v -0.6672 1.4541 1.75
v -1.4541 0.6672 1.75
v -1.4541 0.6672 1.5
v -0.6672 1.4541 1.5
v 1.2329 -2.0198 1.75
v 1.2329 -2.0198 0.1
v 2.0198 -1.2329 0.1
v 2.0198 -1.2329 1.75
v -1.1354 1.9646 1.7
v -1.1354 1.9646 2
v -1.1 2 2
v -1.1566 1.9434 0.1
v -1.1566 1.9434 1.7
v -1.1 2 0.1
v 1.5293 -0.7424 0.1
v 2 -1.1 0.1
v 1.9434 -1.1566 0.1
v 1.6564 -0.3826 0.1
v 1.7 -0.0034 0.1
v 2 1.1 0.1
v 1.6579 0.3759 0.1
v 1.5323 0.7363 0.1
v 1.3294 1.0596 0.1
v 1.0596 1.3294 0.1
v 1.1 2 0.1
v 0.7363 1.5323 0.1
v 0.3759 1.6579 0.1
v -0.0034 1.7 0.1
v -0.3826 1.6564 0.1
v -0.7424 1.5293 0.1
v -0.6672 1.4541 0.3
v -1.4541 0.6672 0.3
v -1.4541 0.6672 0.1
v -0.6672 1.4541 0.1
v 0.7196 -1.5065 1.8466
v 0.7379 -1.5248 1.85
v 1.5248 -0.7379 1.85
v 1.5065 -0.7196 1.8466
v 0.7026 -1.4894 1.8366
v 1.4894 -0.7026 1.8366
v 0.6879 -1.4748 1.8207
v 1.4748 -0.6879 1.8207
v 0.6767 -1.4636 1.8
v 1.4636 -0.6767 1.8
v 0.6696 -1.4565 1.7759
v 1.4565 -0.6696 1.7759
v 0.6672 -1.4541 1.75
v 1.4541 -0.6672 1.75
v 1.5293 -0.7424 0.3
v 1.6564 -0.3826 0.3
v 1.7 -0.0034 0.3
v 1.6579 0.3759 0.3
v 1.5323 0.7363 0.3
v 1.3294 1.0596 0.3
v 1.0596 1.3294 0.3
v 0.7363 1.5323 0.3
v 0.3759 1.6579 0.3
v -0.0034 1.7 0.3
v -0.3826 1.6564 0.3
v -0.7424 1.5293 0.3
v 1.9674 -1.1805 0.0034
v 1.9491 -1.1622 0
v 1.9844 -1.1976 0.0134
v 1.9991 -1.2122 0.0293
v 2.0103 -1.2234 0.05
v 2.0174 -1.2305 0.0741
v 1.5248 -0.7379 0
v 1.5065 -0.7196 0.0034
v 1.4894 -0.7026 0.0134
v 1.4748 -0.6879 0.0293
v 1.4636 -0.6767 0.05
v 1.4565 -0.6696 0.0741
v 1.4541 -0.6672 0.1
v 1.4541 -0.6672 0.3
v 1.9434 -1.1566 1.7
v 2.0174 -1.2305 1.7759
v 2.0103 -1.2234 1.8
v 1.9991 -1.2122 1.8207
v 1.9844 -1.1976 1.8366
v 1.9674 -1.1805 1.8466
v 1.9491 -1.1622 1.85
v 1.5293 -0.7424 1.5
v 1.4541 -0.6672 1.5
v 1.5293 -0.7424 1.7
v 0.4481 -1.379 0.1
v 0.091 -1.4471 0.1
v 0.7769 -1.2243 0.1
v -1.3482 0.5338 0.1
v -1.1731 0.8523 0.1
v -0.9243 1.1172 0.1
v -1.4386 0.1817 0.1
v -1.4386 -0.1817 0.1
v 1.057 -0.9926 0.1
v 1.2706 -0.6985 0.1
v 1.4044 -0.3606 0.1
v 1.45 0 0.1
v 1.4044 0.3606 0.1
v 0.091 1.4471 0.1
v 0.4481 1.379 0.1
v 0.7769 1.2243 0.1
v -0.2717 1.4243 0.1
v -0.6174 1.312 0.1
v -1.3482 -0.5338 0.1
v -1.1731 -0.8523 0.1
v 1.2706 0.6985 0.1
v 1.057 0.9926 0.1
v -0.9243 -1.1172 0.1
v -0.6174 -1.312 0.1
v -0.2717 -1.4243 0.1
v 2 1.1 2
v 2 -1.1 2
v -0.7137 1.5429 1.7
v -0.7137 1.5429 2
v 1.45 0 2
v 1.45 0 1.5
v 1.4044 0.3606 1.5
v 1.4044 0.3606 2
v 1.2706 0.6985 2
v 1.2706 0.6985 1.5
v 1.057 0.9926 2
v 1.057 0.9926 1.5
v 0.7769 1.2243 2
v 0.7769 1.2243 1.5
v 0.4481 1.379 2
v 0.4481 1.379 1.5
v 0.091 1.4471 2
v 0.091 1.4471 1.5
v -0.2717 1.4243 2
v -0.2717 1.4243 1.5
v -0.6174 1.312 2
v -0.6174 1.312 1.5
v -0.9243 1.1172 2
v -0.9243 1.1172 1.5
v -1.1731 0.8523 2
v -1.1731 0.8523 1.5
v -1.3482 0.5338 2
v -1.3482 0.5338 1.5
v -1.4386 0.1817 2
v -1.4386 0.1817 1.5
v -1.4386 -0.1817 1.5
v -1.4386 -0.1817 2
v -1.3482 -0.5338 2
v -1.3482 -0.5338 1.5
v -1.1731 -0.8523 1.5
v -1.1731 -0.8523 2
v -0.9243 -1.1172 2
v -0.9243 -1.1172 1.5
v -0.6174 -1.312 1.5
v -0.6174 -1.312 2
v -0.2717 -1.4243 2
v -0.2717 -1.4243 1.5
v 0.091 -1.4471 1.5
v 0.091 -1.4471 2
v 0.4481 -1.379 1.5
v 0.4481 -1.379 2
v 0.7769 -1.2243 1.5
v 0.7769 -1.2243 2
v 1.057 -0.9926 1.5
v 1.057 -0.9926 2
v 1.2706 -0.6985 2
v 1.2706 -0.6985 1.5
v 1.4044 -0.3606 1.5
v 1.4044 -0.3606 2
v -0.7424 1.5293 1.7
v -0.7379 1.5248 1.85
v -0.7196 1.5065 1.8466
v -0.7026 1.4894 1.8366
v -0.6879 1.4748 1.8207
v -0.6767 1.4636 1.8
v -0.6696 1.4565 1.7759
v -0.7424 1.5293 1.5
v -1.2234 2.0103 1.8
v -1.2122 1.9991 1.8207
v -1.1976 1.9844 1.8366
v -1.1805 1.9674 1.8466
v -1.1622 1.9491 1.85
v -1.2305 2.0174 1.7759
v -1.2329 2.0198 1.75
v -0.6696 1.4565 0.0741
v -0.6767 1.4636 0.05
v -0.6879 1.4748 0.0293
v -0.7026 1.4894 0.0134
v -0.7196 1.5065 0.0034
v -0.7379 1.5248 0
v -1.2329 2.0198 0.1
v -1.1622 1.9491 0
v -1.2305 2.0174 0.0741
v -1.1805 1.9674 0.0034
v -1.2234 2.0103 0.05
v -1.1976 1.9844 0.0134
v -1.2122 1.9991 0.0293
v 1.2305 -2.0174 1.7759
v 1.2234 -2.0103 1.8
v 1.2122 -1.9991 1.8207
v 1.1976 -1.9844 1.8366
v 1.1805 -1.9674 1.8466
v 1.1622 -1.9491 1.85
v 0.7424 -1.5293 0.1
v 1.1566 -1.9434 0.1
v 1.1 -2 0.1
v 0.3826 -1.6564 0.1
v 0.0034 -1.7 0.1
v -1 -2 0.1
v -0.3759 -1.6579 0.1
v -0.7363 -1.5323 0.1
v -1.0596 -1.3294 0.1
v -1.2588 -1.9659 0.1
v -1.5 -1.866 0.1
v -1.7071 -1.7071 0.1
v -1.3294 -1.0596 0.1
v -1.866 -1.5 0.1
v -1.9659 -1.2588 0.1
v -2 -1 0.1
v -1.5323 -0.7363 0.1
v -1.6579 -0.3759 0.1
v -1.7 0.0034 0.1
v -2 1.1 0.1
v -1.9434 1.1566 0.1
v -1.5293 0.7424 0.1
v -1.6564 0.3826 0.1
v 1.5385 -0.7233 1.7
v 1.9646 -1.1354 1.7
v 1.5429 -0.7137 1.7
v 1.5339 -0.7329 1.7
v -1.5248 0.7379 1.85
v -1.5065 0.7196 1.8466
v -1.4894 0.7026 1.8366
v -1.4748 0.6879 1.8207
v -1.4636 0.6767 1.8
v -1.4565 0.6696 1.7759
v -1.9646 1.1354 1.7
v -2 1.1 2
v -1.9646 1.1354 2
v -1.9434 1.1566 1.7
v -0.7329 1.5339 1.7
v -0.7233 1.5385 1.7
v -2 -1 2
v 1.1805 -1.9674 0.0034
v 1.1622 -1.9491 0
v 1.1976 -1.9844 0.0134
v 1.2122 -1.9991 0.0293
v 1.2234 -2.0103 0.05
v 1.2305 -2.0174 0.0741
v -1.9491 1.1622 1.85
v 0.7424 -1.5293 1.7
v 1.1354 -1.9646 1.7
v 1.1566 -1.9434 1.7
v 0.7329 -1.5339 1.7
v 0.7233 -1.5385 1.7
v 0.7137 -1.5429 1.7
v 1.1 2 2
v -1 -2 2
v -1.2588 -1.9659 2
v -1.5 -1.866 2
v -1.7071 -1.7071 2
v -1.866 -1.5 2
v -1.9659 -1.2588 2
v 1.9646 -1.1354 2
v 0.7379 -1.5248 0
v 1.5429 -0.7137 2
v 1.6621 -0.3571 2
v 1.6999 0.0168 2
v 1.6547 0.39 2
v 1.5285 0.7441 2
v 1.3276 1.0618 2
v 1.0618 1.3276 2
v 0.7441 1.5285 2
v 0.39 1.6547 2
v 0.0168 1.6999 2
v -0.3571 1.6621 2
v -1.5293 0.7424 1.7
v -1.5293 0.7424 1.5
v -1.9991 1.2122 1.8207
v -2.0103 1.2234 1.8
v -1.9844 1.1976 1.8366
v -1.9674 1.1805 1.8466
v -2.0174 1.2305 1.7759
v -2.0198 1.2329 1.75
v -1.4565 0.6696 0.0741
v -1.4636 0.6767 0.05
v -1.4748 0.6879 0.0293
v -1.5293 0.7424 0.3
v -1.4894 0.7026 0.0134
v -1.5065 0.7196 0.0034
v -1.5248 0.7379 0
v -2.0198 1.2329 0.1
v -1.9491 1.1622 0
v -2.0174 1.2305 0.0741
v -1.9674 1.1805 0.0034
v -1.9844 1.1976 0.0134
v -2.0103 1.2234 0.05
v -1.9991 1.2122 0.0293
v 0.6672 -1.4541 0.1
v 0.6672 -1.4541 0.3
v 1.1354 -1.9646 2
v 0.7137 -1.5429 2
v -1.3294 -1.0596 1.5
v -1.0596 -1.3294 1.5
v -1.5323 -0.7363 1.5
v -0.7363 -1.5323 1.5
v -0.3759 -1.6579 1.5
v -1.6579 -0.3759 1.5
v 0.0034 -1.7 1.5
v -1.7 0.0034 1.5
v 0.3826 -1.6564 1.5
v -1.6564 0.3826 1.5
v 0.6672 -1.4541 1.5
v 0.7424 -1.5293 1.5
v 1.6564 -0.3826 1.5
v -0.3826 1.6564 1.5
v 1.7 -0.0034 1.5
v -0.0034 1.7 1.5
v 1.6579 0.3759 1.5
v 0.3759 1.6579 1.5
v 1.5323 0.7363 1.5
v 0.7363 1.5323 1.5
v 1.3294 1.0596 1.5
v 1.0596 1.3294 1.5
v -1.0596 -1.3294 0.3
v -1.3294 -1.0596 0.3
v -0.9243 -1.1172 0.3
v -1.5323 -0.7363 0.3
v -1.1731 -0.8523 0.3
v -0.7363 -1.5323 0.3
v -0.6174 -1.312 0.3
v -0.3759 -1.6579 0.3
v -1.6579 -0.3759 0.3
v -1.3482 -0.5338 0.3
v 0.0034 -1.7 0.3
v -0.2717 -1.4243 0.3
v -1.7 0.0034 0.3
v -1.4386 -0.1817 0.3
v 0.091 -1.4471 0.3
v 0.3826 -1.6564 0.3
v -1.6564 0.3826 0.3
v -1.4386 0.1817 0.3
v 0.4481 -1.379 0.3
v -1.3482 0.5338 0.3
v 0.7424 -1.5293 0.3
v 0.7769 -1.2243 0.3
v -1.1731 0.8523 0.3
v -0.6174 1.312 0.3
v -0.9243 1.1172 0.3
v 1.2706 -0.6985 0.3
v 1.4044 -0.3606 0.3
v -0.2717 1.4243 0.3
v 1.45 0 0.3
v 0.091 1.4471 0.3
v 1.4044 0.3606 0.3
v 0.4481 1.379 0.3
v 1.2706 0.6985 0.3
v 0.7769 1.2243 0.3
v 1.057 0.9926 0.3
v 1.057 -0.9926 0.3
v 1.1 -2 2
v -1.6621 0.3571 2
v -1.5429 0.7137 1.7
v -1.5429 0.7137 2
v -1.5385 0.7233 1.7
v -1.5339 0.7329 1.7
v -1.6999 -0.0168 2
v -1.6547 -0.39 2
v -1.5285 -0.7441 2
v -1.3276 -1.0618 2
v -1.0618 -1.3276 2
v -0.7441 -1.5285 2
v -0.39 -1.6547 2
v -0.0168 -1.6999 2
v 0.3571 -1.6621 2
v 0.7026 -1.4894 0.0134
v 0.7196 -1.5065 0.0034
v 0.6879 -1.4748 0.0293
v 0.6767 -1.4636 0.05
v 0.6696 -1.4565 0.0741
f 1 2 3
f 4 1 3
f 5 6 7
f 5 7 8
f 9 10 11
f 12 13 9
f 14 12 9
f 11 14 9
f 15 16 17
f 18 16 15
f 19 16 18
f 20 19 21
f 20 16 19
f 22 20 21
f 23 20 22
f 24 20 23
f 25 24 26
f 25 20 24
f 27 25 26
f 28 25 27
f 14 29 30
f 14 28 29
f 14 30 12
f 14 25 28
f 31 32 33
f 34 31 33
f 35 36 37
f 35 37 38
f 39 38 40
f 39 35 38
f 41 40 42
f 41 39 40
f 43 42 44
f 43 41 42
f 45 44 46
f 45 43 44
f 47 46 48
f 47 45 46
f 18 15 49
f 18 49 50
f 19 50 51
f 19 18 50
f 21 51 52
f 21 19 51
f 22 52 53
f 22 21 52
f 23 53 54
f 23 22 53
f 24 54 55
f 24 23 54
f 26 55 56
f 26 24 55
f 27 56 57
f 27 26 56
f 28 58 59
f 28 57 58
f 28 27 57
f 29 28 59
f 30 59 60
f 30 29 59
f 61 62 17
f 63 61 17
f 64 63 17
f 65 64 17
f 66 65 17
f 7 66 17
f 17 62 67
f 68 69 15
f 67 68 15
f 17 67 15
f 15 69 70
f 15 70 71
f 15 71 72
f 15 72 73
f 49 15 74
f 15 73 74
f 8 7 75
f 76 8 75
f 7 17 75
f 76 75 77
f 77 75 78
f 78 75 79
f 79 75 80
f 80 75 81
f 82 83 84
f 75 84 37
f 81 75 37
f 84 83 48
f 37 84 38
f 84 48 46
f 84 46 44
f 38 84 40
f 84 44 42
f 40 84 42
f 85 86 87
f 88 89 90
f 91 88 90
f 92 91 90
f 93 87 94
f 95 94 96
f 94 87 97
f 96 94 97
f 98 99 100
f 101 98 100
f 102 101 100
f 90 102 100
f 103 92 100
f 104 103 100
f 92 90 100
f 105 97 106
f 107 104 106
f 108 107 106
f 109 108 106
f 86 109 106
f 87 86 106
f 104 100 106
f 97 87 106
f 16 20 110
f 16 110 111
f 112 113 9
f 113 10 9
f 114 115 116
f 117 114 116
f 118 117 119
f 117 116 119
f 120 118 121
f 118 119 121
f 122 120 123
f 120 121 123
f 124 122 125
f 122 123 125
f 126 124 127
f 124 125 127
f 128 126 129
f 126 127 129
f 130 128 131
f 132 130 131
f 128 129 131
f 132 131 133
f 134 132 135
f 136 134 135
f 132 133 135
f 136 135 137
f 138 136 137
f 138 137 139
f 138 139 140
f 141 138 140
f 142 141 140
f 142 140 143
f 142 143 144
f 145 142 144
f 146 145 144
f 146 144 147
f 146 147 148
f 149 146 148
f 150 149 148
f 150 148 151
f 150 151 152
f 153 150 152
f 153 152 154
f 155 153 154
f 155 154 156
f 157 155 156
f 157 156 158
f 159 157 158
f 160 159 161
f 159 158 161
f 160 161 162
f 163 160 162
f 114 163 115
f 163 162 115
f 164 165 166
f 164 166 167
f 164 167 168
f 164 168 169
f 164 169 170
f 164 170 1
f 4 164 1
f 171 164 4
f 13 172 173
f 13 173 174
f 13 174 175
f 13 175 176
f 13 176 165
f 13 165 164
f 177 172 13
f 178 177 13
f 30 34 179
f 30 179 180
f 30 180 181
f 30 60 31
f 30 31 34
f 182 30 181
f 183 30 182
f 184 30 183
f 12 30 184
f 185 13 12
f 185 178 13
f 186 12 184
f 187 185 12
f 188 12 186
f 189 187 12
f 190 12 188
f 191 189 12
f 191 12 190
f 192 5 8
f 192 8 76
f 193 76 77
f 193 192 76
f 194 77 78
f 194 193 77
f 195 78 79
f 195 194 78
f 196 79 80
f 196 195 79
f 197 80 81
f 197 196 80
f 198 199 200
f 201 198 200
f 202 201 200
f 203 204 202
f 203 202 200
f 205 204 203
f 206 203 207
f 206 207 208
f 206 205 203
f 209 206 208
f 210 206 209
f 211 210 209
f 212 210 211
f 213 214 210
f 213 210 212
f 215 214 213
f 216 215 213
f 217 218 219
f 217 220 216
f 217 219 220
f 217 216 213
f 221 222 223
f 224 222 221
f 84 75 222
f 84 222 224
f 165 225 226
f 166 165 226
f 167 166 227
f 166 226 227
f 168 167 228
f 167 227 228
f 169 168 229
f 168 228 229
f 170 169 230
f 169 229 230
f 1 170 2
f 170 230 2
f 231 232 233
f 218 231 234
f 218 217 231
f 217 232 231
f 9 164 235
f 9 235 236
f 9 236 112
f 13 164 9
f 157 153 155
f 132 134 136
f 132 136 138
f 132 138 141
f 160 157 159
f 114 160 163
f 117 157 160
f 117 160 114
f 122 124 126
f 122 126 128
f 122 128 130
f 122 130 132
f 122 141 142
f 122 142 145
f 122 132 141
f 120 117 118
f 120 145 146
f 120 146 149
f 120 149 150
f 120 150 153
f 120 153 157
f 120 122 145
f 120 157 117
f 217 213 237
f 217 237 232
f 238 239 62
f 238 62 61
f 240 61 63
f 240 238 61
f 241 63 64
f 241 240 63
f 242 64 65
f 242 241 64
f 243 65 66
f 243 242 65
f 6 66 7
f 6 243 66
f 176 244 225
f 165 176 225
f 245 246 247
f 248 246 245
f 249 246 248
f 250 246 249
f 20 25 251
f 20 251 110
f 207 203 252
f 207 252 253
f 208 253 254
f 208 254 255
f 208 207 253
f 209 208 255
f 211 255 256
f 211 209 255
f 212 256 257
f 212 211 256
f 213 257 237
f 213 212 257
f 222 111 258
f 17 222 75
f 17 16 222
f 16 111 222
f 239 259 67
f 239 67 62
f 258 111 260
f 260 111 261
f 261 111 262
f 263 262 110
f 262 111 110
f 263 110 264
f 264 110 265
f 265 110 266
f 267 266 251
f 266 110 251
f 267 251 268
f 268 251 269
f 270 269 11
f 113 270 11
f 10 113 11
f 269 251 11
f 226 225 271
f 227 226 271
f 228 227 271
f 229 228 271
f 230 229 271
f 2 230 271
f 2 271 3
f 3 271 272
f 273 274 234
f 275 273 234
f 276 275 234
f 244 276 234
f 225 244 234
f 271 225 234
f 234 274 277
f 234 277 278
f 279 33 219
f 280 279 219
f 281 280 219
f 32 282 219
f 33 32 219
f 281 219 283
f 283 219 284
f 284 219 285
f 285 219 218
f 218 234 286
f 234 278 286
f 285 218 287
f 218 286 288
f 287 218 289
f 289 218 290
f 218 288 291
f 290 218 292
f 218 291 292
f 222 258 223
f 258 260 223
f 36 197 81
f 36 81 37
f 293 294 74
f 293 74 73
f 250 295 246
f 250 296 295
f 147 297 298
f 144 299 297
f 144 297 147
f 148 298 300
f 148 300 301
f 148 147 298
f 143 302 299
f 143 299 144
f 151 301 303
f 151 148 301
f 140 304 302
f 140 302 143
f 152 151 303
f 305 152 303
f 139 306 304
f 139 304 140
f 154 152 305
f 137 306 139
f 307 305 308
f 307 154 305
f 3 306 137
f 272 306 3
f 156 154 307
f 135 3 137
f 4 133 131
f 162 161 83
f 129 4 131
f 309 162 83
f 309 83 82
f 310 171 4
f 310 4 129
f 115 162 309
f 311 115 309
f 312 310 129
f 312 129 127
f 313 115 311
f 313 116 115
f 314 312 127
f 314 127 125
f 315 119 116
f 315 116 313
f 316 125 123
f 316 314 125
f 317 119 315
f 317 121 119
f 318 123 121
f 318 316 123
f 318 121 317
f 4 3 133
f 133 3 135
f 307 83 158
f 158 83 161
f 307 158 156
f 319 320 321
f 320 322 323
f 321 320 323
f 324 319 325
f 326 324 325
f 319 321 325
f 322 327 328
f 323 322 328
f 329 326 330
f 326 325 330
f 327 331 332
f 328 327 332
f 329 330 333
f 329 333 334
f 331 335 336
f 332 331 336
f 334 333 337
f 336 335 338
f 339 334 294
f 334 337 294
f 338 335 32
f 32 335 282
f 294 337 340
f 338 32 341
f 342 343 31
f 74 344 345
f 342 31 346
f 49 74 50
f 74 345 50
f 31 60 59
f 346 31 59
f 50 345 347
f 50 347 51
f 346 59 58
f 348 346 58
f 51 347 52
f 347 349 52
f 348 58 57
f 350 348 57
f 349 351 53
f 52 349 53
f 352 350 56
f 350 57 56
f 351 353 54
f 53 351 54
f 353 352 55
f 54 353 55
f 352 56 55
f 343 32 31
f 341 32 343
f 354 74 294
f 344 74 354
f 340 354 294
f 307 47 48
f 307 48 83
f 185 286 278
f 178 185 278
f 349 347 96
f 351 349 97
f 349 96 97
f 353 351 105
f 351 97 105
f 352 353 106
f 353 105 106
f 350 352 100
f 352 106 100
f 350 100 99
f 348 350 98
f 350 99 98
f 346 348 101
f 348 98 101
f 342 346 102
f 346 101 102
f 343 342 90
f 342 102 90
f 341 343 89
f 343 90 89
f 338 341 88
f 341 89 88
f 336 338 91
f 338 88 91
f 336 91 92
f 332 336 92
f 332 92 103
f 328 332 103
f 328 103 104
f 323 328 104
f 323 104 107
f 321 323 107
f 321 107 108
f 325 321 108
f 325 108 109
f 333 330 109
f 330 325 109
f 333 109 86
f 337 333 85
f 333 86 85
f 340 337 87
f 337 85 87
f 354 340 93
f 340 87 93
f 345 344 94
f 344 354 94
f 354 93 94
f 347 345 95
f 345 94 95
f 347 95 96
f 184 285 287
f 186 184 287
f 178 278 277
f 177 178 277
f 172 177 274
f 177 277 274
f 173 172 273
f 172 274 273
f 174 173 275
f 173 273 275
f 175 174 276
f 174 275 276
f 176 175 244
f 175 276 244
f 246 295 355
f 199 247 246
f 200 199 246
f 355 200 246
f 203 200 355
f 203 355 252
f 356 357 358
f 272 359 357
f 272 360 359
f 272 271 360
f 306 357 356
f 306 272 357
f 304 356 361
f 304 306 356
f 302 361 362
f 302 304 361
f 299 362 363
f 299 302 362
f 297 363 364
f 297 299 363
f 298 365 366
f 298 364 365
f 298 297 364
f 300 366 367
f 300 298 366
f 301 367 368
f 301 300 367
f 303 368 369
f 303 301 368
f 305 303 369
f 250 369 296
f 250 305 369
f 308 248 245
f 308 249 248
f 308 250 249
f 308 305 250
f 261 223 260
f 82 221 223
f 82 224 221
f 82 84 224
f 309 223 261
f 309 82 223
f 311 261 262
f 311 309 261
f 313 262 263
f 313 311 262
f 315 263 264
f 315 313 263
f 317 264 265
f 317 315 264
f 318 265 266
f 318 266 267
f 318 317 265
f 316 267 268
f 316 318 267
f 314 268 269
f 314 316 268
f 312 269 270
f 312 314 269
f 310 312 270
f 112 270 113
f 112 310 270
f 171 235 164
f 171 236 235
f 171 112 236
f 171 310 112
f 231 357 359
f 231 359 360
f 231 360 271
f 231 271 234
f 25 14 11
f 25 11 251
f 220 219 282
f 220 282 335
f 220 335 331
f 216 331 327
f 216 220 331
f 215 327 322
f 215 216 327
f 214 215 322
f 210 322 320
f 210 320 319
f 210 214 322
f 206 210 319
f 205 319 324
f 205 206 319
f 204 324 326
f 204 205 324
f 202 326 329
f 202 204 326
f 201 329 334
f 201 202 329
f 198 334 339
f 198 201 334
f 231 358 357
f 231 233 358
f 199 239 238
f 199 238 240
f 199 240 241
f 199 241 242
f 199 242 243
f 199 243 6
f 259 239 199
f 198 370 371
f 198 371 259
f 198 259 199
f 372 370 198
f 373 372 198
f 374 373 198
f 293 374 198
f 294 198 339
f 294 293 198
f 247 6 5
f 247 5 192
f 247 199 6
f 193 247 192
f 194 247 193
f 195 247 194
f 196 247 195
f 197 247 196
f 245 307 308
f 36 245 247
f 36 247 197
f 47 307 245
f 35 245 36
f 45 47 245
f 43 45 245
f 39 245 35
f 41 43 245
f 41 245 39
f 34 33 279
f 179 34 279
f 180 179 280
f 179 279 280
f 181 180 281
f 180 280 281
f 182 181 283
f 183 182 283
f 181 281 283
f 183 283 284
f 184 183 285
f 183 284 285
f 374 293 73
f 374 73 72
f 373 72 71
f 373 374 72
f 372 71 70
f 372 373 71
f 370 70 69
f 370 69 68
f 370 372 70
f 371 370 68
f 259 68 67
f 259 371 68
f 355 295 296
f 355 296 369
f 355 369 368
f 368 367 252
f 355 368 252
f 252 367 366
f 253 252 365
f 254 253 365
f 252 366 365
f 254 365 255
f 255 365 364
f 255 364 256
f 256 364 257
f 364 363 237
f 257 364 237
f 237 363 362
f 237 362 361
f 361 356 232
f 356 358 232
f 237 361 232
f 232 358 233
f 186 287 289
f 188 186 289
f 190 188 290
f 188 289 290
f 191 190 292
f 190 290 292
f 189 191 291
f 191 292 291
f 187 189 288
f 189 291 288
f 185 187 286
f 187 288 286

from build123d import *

# Parameters (mm, degrees)
EXTRUDE_START        = 0.1
EXTRUDE_1_DEPTH      = 1.9
SKETCH_6_R           = 1.7
CUT_EXTRUDE_5_DEPTH  = 0.3
SKETCH_8_R           = 1.45
EXTRUDE_9_DEPTH      = 0.25
CUT_EXTRUDE_START    = 1.5
SKETCH_6_3_R         = 1.7
CUT_EXTRUDE_12_DEPTH = 0.6
CUT_EXTRUDE_START_2  = 0.05
SKETCH_12_W          = 1.35
SKETCH_12_H          = 0.8
CUT_EXTRUDE_15_DEPTH = 1.172792206
EXTRUDE_START_2      = 1.3
SKETCH_8_3_R         = 1.45
EXTRUDE_16_DEPTH     = 0.7
EXTRUDE_START_3      = 0.08
EXTRUDE_17_DEPTH     = 1.112792206


with BuildPart() as part:
    # Эскиз2 → Вытянуть1 (new body)
    with BuildSketch(Plane.XY.offset(EXTRUDE_START)):
        with BuildLine():
            Line((-1.1, 2), (1.1, 2))
            Line((1.1, 2), (2, 1.1))
            Line((2, 1.1), (2, -1.1))
            Line((2, -1.1), (1.1, -2))
            Line((1.1, -2), (-1, -2))
            ThreePointArc((-1, -2), (-1.707106781, -1.707106781), (-2, -1))
            Line((-2, -1), (-2, 1.1))
            Line((-2, 1.1), (-1.1, 2))
        make_face()
    extrude(amount=EXTRUDE_1_DEPTH)

    # Эскиз6 → Вытянуть5 (cut)
    with BuildSketch(Plane.XY):
        Circle(SKETCH_6_R)
    extrude(amount=CUT_EXTRUDE_5_DEPTH, mode=Mode.SUBTRACT)

    # Эскиз8 → Вытянуть9 (add)
    with BuildSketch(Plane.XY.offset(EXTRUDE_START)):
        Circle(SKETCH_8_R)
    extrude(amount=EXTRUDE_9_DEPTH)

    # Эскиз6<3> → Вытянуть12 (cut)
    with BuildSketch(Plane.XY.offset(CUT_EXTRUDE_START)):
        Circle(SKETCH_6_3_R)
    extrude(amount=CUT_EXTRUDE_12_DEPTH, mode=Mode.SUBTRACT)

    # Эскиз12 → Вытянуть15 (cut)
    with BuildSketch(Plane(origin=(-0.45, -0.45, 0), x_dir=(0, 0, -1), z_dir=(0.7071067811865499, 0.7071067811865452, 0)).offset(CUT_EXTRUDE_START_2)):
        with Locations((-2.375, 1.9)):
            Rectangle(SKETCH_12_W, SKETCH_12_H)
        with Locations((-2.375, -1.9)):
            Rectangle(SKETCH_12_W, SKETCH_12_H)
    extrude(amount=CUT_EXTRUDE_15_DEPTH, mode=Mode.SUBTRACT)

    # Эскиз8<3> → Вытянуть16 (add)
    with BuildSketch(Plane.XY.offset(EXTRUDE_START_2)):
        Circle(SKETCH_8_3_R)
    extrude(amount=EXTRUDE_16_DEPTH)

    # Эскиз10 → Вытянуть17 (add)
    with BuildSketch(Plane(origin=(-0.45, -0.45, 0), x_dir=(0, 0, -1), z_dir=(0.7071067811865499, 0.7071067811865452, 0)).offset(EXTRUDE_START_3)):
        with BuildLine():
            Line((0, 1.6), (0, 2.2))
            ThreePointArc((0, 2.2), (-0.029289322, 2.270710678), (-0.1, 2.3))
            Line((-0.1, 2.3), (-1.75, 2.3))
            ThreePointArc((-1.75, 2.3), (-1.820710678, 2.270710678), (-1.85, 2.2))
            Line((-1.85, 2.2), (-1.85, 1.6))
            ThreePointArc((-1.85, 1.6), (-1.820710678, 1.529289322), (-1.75, 1.5))
            Line((-1.75, 1.5), (-0.1, 1.5))
            ThreePointArc((-0.1, 1.5), (-0.029289322, 1.529289322), (0, 1.6))
        make_face()
        with BuildLine():
            Line((-1.75, -1.5), (-0.1, -1.5))
            ThreePointArc((-0.1, -1.5), (-0.029289322, -1.529289322), (0, -1.6))
            Line((0, -1.6), (0, -2.2))
            ThreePointArc((0, -2.2), (-0.029289322, -2.270710678), (-0.1, -2.3))
            Line((-0.1, -2.3), (-1.75, -2.3))
            ThreePointArc((-1.75, -2.3), (-1.820710678, -2.270710678), (-1.85, -2.2))
            Line((-1.85, -2.2), (-1.85, -1.6))
            ThreePointArc((-1.85, -1.6), (-1.820710678, -1.529289322), (-1.75, -1.5))
        make_face()
    extrude(amount=EXTRUDE_17_DEPTH)


solid = part.part
